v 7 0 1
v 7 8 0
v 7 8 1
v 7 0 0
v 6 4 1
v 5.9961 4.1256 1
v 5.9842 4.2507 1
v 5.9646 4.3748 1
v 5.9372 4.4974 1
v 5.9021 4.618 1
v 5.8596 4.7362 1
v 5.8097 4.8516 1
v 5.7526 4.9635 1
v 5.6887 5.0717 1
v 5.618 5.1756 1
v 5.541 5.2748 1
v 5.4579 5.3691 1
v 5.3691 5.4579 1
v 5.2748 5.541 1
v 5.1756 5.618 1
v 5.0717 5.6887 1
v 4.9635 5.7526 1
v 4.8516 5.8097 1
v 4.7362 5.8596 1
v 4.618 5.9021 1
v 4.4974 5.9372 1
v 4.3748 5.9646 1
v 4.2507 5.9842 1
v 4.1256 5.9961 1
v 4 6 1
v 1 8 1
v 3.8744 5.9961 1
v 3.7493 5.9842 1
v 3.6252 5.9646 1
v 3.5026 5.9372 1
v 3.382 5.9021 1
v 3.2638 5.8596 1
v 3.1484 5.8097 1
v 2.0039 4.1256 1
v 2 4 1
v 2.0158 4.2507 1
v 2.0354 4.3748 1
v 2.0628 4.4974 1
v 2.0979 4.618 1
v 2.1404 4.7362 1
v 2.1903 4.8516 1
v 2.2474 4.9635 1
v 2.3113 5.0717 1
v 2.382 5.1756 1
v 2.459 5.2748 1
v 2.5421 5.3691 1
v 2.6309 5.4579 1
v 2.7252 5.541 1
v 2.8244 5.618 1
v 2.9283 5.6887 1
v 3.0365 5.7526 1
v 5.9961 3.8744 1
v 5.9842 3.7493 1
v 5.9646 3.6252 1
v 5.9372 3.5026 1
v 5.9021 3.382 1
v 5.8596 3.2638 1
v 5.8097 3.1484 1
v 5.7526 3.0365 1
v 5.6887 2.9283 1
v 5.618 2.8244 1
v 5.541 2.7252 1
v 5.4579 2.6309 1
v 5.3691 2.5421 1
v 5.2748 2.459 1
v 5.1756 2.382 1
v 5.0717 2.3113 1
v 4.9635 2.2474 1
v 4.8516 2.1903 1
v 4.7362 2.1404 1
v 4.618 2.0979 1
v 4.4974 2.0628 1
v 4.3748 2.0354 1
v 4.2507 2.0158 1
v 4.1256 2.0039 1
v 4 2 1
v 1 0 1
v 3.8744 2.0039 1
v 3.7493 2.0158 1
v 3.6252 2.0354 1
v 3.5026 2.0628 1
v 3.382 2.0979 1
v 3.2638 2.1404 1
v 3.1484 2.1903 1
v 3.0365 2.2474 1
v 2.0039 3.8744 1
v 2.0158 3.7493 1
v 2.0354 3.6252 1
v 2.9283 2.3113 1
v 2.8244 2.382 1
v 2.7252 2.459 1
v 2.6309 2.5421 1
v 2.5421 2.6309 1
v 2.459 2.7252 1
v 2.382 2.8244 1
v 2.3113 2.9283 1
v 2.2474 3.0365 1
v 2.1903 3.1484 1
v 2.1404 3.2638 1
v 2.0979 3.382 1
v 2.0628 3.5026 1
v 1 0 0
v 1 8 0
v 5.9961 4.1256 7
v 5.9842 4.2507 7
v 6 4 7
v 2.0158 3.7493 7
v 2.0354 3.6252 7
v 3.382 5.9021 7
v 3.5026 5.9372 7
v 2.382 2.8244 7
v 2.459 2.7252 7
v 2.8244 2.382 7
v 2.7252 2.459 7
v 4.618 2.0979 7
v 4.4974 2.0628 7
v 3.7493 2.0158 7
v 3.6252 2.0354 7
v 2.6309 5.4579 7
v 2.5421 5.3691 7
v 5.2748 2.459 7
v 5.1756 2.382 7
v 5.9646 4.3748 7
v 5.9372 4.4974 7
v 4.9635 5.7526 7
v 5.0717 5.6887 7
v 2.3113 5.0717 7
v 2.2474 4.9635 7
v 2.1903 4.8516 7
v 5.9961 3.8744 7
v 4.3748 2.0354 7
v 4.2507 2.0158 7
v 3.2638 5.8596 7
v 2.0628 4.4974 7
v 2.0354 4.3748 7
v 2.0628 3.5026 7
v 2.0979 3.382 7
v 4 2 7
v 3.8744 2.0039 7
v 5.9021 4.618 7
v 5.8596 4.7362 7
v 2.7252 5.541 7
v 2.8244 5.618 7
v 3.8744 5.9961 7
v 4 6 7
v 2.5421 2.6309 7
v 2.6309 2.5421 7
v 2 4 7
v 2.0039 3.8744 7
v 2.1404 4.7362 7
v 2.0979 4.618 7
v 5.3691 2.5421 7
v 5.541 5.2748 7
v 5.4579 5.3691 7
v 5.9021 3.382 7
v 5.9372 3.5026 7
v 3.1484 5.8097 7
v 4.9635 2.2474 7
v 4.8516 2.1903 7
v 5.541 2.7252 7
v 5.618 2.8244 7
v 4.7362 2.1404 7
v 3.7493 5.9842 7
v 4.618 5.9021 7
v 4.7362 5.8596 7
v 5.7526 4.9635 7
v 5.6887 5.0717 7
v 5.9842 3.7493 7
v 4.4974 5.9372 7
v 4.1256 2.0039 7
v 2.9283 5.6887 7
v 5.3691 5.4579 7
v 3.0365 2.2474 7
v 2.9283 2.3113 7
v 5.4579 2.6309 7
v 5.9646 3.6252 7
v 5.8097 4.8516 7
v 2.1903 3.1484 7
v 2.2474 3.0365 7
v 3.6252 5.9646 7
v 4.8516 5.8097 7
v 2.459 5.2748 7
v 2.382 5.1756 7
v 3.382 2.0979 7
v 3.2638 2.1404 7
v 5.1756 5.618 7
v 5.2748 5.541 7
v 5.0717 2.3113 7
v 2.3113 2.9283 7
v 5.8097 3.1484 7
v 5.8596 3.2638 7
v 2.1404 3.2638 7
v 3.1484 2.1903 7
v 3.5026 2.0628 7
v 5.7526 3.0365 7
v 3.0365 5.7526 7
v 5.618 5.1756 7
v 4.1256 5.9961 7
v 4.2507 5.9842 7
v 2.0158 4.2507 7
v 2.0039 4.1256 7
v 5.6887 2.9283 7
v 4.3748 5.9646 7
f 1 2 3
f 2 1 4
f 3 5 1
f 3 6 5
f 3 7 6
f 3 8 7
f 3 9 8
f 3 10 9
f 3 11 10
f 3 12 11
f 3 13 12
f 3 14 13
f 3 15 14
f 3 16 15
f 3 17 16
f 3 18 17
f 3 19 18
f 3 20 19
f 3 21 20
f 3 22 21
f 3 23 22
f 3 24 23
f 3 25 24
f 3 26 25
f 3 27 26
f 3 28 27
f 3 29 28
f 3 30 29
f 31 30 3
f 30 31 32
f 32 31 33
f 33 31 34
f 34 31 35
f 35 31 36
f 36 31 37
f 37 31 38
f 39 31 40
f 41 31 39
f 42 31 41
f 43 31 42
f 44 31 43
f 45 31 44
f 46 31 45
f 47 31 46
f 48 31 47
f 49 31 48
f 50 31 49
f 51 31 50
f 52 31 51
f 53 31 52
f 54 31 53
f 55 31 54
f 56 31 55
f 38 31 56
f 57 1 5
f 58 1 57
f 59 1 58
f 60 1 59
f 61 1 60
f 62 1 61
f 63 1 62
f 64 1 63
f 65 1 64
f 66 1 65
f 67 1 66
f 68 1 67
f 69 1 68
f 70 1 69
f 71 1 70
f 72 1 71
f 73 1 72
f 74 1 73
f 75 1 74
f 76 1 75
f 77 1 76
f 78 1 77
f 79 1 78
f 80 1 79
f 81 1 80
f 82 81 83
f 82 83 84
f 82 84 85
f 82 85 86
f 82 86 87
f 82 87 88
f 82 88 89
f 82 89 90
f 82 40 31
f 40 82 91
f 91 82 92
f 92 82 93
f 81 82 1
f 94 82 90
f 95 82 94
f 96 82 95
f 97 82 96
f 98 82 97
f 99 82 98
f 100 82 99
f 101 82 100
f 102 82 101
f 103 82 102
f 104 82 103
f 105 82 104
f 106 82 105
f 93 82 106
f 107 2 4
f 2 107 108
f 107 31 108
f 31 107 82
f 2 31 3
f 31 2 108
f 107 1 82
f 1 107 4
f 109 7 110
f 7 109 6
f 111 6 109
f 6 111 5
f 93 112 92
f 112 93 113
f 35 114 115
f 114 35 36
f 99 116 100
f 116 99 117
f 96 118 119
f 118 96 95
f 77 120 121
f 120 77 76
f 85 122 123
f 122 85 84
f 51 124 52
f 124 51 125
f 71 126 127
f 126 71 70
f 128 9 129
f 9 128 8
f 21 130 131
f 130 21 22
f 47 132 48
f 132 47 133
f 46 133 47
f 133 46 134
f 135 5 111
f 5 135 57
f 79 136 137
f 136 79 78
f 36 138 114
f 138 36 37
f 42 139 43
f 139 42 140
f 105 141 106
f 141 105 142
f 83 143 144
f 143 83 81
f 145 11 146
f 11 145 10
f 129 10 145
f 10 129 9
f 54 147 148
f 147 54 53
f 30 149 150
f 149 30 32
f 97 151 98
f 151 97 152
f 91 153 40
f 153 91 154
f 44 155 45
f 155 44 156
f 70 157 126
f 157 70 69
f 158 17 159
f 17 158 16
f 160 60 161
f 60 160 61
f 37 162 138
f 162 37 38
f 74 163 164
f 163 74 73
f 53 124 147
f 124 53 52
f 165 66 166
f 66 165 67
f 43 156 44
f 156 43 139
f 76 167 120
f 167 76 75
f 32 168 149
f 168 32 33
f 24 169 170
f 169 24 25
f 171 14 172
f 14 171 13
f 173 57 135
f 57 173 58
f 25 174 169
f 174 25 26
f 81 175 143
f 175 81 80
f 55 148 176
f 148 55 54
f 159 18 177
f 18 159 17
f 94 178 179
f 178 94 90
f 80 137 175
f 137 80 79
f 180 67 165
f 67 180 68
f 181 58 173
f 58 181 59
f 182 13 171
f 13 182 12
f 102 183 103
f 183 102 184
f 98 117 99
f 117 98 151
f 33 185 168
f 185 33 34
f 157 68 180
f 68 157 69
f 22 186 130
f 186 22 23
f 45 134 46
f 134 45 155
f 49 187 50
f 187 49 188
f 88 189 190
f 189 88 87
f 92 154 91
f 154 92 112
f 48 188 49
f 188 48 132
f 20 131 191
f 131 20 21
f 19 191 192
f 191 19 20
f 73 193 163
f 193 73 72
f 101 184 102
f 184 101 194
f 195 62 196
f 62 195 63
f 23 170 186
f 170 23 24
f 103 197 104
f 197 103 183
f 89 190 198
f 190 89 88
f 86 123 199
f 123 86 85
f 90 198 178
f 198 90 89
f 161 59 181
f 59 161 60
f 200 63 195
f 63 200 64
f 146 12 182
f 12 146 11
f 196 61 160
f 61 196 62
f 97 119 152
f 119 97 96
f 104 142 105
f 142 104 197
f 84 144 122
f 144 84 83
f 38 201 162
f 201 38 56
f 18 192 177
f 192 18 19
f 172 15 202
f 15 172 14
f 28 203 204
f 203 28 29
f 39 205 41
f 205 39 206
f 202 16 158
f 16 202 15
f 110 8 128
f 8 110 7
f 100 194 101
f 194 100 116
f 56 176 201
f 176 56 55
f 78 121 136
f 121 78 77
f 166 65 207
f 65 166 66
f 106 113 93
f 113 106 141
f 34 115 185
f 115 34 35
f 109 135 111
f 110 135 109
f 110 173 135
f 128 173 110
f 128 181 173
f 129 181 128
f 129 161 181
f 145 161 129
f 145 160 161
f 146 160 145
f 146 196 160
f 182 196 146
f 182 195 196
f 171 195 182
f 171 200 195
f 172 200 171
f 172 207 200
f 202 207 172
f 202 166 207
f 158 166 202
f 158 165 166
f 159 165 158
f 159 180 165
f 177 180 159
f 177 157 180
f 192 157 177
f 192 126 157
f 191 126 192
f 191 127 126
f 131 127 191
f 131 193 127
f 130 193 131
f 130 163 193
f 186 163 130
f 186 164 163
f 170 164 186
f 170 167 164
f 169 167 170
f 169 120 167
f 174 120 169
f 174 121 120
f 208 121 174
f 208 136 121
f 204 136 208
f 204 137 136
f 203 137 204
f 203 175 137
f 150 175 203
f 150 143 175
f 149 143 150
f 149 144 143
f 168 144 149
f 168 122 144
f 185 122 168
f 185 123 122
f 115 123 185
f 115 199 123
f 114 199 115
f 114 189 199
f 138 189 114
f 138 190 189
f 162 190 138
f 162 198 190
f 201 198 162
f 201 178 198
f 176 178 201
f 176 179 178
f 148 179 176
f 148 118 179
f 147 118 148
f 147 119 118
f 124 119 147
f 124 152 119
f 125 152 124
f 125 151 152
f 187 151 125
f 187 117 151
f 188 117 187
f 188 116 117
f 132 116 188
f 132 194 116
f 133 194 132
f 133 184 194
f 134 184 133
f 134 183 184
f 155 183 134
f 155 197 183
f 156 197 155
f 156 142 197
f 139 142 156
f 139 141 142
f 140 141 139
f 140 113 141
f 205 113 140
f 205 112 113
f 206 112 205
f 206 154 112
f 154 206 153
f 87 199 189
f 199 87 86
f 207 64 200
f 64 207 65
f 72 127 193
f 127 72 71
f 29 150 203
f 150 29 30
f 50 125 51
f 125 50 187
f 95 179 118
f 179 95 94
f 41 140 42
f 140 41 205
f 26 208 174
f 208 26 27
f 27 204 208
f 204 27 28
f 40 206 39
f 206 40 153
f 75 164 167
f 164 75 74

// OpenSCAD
difference(){
	union(){
        

        translate([1,0,0]){
            cube([6,8,1], center=false);
        }         
        translate([4,4,0]){
            rotate([0,0,0]){
                cylinder(h=7, r=2, $fn=100, center=false);
            }
        }         

          
      

	}
	union() {

	}
}
